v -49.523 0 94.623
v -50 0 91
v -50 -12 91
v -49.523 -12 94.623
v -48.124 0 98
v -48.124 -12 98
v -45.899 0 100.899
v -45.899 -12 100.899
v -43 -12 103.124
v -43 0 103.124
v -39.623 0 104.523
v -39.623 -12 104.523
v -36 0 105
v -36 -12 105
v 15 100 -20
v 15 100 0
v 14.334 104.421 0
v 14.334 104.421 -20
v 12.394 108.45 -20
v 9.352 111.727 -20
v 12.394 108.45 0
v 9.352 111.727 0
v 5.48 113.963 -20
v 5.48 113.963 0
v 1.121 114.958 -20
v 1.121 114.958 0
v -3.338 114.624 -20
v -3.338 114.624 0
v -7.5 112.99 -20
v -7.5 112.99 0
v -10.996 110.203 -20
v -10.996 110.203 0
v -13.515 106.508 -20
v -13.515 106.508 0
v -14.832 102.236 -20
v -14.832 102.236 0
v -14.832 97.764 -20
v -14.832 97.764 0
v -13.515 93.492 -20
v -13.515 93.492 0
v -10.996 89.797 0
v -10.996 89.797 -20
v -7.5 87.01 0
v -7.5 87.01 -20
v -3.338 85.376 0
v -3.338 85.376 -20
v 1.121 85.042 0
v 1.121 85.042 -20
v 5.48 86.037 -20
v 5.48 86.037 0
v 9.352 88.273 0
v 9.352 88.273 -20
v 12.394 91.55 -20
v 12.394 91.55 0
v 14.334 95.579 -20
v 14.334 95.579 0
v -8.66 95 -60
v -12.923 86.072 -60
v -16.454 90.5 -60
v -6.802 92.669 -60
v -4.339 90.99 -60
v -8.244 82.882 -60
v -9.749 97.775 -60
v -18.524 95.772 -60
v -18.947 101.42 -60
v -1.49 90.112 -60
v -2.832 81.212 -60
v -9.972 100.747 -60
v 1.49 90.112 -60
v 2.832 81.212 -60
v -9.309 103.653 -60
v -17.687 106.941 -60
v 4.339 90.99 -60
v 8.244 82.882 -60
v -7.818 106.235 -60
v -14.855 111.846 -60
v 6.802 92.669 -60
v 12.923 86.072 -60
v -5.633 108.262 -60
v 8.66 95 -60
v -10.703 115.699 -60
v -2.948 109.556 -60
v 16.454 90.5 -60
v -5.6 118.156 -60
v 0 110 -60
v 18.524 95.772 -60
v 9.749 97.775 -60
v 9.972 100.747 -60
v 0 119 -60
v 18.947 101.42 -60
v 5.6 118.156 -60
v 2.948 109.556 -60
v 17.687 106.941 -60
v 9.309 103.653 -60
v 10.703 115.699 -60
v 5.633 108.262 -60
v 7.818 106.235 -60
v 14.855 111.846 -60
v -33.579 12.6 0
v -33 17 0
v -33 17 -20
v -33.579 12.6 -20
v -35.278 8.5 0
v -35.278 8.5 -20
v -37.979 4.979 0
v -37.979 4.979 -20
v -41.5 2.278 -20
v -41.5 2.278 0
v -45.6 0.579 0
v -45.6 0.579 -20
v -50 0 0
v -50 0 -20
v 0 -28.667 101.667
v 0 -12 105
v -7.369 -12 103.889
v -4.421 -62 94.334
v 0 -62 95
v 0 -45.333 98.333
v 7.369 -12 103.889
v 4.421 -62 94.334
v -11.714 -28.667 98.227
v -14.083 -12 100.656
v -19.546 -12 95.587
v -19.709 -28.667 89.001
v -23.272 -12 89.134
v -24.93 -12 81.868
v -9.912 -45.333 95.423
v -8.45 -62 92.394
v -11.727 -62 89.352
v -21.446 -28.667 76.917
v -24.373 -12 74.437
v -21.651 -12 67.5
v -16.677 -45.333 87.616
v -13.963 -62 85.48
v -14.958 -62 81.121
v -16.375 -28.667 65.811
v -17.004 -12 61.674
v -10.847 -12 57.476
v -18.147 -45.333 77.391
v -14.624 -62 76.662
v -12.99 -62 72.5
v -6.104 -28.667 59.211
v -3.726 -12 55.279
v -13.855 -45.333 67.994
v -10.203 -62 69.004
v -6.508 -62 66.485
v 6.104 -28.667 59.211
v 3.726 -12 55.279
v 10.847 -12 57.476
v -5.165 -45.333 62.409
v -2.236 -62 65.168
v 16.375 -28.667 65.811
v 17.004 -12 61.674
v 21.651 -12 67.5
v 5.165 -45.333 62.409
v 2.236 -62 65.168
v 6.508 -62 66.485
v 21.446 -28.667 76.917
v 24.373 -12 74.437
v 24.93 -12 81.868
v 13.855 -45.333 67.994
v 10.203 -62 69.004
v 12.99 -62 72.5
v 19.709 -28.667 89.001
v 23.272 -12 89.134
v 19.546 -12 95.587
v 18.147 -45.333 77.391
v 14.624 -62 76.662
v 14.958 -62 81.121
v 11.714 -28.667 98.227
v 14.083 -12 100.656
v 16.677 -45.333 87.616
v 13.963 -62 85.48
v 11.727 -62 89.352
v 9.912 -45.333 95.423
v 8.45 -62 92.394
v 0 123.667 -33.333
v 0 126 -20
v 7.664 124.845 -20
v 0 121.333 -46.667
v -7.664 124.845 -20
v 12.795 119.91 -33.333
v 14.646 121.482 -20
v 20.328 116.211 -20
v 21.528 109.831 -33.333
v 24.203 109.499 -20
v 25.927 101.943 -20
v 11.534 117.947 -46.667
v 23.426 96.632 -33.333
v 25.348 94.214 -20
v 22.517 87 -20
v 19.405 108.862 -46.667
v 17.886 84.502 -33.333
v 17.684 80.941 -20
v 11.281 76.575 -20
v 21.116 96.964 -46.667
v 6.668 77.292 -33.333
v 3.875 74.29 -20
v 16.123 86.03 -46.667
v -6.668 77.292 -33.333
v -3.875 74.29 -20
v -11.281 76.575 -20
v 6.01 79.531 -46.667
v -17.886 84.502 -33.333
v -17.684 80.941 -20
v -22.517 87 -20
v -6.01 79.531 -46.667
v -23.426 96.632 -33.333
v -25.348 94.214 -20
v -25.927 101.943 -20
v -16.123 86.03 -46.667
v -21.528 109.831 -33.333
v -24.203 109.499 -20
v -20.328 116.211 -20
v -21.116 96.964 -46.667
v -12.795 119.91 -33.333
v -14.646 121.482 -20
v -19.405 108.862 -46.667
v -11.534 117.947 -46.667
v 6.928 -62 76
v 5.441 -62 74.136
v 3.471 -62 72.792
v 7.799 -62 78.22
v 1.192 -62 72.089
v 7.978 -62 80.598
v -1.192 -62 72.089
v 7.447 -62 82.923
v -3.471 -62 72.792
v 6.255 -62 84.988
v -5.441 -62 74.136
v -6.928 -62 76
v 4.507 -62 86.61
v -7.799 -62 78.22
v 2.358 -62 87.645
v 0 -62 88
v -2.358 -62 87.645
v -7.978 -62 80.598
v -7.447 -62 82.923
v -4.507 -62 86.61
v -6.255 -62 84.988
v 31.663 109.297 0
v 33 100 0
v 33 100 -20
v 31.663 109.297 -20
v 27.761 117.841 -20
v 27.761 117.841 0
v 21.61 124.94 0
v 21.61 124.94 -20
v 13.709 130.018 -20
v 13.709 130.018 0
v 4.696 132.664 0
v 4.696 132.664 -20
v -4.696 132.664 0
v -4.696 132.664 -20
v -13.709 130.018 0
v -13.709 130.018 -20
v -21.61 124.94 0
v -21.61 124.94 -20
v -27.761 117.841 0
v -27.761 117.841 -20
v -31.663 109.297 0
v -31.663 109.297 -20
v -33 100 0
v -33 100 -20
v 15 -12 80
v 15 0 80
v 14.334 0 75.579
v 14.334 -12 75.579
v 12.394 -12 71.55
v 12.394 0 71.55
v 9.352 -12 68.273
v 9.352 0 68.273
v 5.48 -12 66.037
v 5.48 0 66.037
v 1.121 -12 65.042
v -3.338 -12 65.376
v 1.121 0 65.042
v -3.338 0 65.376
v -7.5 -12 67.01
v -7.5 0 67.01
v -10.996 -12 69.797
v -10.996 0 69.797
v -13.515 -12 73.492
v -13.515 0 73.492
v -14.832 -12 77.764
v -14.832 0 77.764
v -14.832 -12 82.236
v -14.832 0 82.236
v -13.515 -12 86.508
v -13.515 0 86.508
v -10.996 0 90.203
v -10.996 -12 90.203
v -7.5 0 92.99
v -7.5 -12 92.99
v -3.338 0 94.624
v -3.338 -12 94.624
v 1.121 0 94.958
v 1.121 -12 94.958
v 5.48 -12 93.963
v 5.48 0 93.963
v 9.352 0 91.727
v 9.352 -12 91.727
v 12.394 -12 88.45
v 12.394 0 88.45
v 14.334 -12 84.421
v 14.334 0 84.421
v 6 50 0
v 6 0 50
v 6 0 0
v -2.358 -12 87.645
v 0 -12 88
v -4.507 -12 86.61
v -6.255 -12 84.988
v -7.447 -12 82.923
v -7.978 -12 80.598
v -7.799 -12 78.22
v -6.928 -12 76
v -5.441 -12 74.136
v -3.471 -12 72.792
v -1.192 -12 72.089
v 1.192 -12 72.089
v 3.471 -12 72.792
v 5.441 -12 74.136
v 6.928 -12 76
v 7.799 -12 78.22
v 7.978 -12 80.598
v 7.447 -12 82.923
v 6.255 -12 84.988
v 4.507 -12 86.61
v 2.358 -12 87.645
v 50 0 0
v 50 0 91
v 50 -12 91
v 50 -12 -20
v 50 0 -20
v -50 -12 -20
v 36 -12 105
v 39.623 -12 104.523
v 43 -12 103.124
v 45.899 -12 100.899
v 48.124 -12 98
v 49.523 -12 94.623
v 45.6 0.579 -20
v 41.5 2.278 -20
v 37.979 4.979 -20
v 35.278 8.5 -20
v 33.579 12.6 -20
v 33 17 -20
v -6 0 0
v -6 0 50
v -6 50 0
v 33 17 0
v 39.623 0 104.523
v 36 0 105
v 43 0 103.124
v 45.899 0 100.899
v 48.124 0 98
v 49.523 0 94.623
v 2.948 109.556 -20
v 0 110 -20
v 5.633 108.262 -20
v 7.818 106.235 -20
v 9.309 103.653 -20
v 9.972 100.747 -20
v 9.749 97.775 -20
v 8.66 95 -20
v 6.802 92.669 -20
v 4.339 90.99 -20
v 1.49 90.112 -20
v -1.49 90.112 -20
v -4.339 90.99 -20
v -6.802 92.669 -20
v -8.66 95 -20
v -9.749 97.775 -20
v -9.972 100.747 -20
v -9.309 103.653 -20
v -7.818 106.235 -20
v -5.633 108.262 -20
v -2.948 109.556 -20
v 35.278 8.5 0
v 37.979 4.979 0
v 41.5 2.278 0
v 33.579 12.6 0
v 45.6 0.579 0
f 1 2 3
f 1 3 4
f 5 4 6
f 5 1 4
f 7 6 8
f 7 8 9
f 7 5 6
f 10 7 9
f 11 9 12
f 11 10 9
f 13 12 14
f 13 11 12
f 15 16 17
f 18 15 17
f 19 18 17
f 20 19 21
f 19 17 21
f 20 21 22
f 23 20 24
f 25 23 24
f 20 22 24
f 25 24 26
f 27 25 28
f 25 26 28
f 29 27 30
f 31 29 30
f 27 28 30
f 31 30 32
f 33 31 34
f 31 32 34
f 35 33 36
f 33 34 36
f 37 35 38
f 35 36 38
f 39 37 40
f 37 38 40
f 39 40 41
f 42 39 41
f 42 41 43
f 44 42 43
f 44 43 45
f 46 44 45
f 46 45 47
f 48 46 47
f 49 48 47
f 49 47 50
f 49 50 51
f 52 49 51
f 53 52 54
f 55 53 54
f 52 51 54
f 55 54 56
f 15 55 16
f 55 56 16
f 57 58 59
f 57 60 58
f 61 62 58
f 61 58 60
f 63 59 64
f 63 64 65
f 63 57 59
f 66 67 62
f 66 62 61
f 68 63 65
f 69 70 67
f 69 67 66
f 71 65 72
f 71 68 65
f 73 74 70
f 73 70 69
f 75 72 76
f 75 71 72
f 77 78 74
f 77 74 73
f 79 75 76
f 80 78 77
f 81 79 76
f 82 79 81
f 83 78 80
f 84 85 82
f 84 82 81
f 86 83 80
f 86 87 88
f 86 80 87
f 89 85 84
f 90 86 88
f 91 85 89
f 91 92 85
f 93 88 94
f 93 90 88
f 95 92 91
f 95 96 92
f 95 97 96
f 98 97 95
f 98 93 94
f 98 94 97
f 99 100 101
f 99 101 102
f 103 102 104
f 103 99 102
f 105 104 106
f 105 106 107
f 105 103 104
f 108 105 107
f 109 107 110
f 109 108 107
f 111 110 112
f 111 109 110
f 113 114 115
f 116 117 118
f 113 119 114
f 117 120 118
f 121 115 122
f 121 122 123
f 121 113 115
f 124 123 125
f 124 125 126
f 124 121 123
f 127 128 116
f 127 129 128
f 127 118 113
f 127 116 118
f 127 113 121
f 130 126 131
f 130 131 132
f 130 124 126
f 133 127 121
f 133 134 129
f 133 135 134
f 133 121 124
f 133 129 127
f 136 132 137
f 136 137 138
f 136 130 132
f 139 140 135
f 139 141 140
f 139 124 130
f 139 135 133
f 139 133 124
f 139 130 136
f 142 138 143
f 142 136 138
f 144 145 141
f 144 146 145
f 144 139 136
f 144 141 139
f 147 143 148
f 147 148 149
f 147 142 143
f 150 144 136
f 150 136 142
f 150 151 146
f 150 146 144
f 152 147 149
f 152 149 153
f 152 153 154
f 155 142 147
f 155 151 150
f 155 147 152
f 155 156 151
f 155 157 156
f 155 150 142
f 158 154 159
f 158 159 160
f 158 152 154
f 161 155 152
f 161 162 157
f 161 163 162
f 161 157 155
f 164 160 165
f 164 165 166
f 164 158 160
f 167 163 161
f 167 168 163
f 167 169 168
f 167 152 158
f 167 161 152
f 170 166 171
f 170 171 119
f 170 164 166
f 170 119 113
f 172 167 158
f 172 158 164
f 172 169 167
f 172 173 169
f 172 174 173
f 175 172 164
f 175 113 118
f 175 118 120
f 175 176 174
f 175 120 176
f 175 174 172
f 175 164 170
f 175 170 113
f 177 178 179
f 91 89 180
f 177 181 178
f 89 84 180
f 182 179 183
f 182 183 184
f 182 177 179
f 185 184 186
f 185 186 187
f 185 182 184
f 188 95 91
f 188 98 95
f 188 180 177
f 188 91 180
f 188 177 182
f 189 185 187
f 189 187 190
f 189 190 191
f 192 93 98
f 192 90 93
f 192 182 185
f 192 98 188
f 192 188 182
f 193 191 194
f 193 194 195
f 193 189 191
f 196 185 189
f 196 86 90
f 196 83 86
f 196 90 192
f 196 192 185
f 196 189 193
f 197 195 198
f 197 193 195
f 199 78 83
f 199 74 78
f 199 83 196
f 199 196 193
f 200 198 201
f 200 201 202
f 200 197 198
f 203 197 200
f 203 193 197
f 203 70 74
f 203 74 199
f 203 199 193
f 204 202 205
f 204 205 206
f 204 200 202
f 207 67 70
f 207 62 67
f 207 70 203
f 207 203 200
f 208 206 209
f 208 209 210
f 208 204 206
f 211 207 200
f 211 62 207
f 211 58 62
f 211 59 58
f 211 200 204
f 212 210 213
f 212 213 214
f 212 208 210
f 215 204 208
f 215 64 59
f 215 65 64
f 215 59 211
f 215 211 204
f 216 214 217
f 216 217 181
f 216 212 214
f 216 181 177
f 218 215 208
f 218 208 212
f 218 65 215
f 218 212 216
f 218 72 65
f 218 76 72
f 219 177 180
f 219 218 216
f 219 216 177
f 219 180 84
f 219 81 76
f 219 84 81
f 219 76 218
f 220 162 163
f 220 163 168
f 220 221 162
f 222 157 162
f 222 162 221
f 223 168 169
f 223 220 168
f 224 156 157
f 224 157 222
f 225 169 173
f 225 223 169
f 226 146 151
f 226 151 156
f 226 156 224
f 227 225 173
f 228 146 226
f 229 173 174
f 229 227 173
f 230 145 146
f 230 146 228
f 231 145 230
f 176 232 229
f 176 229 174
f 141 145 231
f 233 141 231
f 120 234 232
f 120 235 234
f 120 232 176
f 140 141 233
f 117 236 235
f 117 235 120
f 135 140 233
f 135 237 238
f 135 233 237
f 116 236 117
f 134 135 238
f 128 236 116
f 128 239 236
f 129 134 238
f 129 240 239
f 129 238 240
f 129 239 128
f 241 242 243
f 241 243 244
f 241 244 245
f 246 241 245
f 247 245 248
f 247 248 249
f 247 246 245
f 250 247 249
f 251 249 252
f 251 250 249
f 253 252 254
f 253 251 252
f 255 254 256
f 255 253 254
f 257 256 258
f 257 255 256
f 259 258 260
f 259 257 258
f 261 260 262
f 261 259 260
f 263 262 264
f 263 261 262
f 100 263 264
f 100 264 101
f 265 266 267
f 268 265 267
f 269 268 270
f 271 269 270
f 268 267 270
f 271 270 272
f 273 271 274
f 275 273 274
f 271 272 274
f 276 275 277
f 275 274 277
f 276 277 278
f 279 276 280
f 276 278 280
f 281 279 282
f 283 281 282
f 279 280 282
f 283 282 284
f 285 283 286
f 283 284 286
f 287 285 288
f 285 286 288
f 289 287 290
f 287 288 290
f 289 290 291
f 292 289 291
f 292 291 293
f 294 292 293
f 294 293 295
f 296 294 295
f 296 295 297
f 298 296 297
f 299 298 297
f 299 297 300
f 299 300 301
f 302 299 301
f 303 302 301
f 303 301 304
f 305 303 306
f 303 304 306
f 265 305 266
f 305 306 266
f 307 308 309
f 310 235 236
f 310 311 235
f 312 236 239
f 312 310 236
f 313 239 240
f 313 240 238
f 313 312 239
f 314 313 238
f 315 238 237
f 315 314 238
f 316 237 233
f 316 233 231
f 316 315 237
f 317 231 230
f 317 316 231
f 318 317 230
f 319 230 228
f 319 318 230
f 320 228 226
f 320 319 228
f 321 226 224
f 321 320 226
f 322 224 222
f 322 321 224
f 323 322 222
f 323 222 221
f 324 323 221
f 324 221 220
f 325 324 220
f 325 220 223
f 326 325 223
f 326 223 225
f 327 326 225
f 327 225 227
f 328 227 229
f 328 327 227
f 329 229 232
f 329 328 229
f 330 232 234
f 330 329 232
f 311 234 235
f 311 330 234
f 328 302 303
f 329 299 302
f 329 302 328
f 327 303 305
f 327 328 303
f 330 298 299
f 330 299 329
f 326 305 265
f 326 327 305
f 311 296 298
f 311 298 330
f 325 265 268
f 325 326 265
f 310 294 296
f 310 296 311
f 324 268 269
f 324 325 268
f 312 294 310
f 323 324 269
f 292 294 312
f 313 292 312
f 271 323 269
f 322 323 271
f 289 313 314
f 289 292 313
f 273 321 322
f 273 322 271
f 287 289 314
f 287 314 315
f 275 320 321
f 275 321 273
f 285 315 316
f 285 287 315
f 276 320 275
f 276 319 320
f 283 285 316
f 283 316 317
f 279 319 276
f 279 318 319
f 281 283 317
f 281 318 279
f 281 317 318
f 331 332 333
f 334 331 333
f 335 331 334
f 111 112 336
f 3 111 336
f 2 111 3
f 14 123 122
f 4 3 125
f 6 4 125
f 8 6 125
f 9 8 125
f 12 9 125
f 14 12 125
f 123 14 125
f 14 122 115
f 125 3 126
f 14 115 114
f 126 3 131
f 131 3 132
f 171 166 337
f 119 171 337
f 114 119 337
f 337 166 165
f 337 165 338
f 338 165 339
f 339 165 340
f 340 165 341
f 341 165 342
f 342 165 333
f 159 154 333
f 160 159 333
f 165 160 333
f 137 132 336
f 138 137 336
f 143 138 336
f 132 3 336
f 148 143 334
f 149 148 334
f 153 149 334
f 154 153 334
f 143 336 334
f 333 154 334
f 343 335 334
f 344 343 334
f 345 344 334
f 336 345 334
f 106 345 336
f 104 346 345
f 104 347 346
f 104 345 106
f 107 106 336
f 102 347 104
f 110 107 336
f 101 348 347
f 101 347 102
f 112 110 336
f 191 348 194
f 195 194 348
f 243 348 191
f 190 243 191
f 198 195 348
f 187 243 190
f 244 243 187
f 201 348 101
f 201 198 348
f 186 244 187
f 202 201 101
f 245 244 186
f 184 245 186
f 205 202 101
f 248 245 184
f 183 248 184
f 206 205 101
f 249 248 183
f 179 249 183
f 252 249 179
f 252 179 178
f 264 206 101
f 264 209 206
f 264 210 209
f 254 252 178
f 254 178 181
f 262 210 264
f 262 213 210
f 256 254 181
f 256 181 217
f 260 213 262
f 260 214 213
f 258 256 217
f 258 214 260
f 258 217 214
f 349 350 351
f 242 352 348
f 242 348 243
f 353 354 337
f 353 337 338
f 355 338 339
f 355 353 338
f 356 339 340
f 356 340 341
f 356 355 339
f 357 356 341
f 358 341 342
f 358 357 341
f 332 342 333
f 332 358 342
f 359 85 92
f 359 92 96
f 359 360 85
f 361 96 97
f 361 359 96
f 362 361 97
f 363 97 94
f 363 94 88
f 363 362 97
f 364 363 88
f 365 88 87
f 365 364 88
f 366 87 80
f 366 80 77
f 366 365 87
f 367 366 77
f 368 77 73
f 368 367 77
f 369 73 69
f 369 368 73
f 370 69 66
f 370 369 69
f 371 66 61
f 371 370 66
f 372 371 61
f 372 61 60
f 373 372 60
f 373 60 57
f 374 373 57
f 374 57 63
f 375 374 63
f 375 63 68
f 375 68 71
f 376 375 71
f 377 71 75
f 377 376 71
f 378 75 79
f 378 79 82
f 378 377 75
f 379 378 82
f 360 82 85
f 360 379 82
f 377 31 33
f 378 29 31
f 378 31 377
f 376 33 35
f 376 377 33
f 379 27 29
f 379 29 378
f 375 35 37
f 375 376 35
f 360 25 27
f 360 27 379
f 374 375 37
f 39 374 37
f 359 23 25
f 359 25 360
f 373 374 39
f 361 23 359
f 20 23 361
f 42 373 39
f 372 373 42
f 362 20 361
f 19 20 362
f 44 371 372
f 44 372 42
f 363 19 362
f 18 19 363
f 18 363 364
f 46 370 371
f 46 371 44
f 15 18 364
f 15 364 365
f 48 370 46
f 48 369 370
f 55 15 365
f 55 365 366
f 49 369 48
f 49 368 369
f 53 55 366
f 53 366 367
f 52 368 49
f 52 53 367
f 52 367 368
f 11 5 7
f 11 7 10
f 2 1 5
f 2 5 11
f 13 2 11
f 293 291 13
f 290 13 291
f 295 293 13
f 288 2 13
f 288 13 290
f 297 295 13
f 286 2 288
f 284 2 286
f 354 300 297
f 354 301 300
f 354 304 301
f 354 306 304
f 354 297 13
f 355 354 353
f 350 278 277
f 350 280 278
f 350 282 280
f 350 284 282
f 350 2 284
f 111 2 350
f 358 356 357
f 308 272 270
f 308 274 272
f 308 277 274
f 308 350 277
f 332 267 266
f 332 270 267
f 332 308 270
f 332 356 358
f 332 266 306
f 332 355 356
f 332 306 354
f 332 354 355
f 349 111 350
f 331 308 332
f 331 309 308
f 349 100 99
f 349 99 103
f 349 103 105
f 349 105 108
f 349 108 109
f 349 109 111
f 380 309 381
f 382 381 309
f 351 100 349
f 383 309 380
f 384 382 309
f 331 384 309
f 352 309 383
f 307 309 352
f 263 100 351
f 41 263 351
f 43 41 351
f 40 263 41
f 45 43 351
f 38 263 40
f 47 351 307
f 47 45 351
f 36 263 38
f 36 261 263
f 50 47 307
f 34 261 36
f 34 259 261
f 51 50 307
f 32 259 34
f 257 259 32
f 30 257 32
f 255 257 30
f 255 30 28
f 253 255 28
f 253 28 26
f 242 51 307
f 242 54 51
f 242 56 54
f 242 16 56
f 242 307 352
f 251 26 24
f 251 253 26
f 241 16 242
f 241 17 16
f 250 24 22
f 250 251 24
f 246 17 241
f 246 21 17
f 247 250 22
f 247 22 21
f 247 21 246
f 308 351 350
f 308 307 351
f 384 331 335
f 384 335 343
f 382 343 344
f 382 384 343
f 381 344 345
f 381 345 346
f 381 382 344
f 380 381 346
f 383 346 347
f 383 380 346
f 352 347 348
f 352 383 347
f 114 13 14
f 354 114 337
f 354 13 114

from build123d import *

# Parameters (mm, degrees)
CROQUIS1_R              = 15
SALIENTE_EXTRUIR1_DEPTH = 20
CROQUIS2_R              = 15
SALIENTE_EXTRUIR2_DEPTH = 12
SALIENTE_EXTRUIR3_DEPTH = 6


with BuildPart() as part:
    # Croquis1 → Saliente-Extruir1 (new body)
    with BuildSketch(Plane.XY):
        with BuildLine():
            Line((-50, 0), (50, 0))
            ThreePointArc((50, 0), (37.97918472, 4.97918472), (33, 17))
            Line((33, 17), (33, 100))
            ThreePointArc((33, 100), (0, 133), (-33, 100))
            Line((-33, 100), (-33, 17))
            ThreePointArc((-33, 17), (-37.97918472, 4.97918472), (-50, 0))
        make_face()
        with Locations((0, 100)):
            Circle(CROQUIS1_R, mode=Mode.SUBTRACT)
    extrude(amount=-SALIENTE_EXTRUIR1_DEPTH)

    # Croquis2 → Saliente-Extruir2 (add)
    with BuildSketch(Plane(origin=(0, 0, 0), x_dir=(1, 0, 0), z_dir=(0, 1, 0))):
        with BuildLine():
            Line((-50, 20), (-50, -91))
            ThreePointArc((-50, -91), (-45.899494937, -100.899494937), (-36, -105))
            Line((-36, -105), (36, -105))
            ThreePointArc((36, -105), (45.899494937, -100.899494937), (50, -91))
            Line((50, -91), (50, 20))
            Line((50, 20), (-50, 20))
        make_face()
        with Locations((0, -80)):
            Circle(CROQUIS2_R, mode=Mode.SUBTRACT)
    extrude(amount=-SALIENTE_EXTRUIR2_DEPTH)

    # Croquis3 → Saliente-Extruir3 (add, symmetric)
    with BuildSketch(Plane(origin=(0, 0, 0), x_dir=(0, 0, -1), z_dir=(1, 0, 0))):
        Polygon((0, 50), (-50, 0), (0, 0), align=None)
    extrude(amount=SALIENTE_EXTRUIR3_DEPTH, both=True)

    # Croquis5 → Revolución1 (revolve)
    with BuildSketch(Plane(origin=(0, 0, 0), x_dir=(0, 0, -1), z_dir=(1, 0, 0))):
        Polygon((20, 126), (60, 119), (60, 110), (20, 110), align=None)
    revolve(axis=Axis((0, 100, 0), (0, 0, -1)))

    # Croquis6 → Revolución2 (revolve)
    with BuildSketch(Plane(origin=(0, 0, 0), x_dir=(0, 0, -1), z_dir=(1, 0, 0))):
        Polygon((-105, -12), (-95, -62), (-88, -62), (-88, -12), align=None)
    revolve(axis=Axis((0, -12, 80), (0, -1, 0)))


solid = part.part
